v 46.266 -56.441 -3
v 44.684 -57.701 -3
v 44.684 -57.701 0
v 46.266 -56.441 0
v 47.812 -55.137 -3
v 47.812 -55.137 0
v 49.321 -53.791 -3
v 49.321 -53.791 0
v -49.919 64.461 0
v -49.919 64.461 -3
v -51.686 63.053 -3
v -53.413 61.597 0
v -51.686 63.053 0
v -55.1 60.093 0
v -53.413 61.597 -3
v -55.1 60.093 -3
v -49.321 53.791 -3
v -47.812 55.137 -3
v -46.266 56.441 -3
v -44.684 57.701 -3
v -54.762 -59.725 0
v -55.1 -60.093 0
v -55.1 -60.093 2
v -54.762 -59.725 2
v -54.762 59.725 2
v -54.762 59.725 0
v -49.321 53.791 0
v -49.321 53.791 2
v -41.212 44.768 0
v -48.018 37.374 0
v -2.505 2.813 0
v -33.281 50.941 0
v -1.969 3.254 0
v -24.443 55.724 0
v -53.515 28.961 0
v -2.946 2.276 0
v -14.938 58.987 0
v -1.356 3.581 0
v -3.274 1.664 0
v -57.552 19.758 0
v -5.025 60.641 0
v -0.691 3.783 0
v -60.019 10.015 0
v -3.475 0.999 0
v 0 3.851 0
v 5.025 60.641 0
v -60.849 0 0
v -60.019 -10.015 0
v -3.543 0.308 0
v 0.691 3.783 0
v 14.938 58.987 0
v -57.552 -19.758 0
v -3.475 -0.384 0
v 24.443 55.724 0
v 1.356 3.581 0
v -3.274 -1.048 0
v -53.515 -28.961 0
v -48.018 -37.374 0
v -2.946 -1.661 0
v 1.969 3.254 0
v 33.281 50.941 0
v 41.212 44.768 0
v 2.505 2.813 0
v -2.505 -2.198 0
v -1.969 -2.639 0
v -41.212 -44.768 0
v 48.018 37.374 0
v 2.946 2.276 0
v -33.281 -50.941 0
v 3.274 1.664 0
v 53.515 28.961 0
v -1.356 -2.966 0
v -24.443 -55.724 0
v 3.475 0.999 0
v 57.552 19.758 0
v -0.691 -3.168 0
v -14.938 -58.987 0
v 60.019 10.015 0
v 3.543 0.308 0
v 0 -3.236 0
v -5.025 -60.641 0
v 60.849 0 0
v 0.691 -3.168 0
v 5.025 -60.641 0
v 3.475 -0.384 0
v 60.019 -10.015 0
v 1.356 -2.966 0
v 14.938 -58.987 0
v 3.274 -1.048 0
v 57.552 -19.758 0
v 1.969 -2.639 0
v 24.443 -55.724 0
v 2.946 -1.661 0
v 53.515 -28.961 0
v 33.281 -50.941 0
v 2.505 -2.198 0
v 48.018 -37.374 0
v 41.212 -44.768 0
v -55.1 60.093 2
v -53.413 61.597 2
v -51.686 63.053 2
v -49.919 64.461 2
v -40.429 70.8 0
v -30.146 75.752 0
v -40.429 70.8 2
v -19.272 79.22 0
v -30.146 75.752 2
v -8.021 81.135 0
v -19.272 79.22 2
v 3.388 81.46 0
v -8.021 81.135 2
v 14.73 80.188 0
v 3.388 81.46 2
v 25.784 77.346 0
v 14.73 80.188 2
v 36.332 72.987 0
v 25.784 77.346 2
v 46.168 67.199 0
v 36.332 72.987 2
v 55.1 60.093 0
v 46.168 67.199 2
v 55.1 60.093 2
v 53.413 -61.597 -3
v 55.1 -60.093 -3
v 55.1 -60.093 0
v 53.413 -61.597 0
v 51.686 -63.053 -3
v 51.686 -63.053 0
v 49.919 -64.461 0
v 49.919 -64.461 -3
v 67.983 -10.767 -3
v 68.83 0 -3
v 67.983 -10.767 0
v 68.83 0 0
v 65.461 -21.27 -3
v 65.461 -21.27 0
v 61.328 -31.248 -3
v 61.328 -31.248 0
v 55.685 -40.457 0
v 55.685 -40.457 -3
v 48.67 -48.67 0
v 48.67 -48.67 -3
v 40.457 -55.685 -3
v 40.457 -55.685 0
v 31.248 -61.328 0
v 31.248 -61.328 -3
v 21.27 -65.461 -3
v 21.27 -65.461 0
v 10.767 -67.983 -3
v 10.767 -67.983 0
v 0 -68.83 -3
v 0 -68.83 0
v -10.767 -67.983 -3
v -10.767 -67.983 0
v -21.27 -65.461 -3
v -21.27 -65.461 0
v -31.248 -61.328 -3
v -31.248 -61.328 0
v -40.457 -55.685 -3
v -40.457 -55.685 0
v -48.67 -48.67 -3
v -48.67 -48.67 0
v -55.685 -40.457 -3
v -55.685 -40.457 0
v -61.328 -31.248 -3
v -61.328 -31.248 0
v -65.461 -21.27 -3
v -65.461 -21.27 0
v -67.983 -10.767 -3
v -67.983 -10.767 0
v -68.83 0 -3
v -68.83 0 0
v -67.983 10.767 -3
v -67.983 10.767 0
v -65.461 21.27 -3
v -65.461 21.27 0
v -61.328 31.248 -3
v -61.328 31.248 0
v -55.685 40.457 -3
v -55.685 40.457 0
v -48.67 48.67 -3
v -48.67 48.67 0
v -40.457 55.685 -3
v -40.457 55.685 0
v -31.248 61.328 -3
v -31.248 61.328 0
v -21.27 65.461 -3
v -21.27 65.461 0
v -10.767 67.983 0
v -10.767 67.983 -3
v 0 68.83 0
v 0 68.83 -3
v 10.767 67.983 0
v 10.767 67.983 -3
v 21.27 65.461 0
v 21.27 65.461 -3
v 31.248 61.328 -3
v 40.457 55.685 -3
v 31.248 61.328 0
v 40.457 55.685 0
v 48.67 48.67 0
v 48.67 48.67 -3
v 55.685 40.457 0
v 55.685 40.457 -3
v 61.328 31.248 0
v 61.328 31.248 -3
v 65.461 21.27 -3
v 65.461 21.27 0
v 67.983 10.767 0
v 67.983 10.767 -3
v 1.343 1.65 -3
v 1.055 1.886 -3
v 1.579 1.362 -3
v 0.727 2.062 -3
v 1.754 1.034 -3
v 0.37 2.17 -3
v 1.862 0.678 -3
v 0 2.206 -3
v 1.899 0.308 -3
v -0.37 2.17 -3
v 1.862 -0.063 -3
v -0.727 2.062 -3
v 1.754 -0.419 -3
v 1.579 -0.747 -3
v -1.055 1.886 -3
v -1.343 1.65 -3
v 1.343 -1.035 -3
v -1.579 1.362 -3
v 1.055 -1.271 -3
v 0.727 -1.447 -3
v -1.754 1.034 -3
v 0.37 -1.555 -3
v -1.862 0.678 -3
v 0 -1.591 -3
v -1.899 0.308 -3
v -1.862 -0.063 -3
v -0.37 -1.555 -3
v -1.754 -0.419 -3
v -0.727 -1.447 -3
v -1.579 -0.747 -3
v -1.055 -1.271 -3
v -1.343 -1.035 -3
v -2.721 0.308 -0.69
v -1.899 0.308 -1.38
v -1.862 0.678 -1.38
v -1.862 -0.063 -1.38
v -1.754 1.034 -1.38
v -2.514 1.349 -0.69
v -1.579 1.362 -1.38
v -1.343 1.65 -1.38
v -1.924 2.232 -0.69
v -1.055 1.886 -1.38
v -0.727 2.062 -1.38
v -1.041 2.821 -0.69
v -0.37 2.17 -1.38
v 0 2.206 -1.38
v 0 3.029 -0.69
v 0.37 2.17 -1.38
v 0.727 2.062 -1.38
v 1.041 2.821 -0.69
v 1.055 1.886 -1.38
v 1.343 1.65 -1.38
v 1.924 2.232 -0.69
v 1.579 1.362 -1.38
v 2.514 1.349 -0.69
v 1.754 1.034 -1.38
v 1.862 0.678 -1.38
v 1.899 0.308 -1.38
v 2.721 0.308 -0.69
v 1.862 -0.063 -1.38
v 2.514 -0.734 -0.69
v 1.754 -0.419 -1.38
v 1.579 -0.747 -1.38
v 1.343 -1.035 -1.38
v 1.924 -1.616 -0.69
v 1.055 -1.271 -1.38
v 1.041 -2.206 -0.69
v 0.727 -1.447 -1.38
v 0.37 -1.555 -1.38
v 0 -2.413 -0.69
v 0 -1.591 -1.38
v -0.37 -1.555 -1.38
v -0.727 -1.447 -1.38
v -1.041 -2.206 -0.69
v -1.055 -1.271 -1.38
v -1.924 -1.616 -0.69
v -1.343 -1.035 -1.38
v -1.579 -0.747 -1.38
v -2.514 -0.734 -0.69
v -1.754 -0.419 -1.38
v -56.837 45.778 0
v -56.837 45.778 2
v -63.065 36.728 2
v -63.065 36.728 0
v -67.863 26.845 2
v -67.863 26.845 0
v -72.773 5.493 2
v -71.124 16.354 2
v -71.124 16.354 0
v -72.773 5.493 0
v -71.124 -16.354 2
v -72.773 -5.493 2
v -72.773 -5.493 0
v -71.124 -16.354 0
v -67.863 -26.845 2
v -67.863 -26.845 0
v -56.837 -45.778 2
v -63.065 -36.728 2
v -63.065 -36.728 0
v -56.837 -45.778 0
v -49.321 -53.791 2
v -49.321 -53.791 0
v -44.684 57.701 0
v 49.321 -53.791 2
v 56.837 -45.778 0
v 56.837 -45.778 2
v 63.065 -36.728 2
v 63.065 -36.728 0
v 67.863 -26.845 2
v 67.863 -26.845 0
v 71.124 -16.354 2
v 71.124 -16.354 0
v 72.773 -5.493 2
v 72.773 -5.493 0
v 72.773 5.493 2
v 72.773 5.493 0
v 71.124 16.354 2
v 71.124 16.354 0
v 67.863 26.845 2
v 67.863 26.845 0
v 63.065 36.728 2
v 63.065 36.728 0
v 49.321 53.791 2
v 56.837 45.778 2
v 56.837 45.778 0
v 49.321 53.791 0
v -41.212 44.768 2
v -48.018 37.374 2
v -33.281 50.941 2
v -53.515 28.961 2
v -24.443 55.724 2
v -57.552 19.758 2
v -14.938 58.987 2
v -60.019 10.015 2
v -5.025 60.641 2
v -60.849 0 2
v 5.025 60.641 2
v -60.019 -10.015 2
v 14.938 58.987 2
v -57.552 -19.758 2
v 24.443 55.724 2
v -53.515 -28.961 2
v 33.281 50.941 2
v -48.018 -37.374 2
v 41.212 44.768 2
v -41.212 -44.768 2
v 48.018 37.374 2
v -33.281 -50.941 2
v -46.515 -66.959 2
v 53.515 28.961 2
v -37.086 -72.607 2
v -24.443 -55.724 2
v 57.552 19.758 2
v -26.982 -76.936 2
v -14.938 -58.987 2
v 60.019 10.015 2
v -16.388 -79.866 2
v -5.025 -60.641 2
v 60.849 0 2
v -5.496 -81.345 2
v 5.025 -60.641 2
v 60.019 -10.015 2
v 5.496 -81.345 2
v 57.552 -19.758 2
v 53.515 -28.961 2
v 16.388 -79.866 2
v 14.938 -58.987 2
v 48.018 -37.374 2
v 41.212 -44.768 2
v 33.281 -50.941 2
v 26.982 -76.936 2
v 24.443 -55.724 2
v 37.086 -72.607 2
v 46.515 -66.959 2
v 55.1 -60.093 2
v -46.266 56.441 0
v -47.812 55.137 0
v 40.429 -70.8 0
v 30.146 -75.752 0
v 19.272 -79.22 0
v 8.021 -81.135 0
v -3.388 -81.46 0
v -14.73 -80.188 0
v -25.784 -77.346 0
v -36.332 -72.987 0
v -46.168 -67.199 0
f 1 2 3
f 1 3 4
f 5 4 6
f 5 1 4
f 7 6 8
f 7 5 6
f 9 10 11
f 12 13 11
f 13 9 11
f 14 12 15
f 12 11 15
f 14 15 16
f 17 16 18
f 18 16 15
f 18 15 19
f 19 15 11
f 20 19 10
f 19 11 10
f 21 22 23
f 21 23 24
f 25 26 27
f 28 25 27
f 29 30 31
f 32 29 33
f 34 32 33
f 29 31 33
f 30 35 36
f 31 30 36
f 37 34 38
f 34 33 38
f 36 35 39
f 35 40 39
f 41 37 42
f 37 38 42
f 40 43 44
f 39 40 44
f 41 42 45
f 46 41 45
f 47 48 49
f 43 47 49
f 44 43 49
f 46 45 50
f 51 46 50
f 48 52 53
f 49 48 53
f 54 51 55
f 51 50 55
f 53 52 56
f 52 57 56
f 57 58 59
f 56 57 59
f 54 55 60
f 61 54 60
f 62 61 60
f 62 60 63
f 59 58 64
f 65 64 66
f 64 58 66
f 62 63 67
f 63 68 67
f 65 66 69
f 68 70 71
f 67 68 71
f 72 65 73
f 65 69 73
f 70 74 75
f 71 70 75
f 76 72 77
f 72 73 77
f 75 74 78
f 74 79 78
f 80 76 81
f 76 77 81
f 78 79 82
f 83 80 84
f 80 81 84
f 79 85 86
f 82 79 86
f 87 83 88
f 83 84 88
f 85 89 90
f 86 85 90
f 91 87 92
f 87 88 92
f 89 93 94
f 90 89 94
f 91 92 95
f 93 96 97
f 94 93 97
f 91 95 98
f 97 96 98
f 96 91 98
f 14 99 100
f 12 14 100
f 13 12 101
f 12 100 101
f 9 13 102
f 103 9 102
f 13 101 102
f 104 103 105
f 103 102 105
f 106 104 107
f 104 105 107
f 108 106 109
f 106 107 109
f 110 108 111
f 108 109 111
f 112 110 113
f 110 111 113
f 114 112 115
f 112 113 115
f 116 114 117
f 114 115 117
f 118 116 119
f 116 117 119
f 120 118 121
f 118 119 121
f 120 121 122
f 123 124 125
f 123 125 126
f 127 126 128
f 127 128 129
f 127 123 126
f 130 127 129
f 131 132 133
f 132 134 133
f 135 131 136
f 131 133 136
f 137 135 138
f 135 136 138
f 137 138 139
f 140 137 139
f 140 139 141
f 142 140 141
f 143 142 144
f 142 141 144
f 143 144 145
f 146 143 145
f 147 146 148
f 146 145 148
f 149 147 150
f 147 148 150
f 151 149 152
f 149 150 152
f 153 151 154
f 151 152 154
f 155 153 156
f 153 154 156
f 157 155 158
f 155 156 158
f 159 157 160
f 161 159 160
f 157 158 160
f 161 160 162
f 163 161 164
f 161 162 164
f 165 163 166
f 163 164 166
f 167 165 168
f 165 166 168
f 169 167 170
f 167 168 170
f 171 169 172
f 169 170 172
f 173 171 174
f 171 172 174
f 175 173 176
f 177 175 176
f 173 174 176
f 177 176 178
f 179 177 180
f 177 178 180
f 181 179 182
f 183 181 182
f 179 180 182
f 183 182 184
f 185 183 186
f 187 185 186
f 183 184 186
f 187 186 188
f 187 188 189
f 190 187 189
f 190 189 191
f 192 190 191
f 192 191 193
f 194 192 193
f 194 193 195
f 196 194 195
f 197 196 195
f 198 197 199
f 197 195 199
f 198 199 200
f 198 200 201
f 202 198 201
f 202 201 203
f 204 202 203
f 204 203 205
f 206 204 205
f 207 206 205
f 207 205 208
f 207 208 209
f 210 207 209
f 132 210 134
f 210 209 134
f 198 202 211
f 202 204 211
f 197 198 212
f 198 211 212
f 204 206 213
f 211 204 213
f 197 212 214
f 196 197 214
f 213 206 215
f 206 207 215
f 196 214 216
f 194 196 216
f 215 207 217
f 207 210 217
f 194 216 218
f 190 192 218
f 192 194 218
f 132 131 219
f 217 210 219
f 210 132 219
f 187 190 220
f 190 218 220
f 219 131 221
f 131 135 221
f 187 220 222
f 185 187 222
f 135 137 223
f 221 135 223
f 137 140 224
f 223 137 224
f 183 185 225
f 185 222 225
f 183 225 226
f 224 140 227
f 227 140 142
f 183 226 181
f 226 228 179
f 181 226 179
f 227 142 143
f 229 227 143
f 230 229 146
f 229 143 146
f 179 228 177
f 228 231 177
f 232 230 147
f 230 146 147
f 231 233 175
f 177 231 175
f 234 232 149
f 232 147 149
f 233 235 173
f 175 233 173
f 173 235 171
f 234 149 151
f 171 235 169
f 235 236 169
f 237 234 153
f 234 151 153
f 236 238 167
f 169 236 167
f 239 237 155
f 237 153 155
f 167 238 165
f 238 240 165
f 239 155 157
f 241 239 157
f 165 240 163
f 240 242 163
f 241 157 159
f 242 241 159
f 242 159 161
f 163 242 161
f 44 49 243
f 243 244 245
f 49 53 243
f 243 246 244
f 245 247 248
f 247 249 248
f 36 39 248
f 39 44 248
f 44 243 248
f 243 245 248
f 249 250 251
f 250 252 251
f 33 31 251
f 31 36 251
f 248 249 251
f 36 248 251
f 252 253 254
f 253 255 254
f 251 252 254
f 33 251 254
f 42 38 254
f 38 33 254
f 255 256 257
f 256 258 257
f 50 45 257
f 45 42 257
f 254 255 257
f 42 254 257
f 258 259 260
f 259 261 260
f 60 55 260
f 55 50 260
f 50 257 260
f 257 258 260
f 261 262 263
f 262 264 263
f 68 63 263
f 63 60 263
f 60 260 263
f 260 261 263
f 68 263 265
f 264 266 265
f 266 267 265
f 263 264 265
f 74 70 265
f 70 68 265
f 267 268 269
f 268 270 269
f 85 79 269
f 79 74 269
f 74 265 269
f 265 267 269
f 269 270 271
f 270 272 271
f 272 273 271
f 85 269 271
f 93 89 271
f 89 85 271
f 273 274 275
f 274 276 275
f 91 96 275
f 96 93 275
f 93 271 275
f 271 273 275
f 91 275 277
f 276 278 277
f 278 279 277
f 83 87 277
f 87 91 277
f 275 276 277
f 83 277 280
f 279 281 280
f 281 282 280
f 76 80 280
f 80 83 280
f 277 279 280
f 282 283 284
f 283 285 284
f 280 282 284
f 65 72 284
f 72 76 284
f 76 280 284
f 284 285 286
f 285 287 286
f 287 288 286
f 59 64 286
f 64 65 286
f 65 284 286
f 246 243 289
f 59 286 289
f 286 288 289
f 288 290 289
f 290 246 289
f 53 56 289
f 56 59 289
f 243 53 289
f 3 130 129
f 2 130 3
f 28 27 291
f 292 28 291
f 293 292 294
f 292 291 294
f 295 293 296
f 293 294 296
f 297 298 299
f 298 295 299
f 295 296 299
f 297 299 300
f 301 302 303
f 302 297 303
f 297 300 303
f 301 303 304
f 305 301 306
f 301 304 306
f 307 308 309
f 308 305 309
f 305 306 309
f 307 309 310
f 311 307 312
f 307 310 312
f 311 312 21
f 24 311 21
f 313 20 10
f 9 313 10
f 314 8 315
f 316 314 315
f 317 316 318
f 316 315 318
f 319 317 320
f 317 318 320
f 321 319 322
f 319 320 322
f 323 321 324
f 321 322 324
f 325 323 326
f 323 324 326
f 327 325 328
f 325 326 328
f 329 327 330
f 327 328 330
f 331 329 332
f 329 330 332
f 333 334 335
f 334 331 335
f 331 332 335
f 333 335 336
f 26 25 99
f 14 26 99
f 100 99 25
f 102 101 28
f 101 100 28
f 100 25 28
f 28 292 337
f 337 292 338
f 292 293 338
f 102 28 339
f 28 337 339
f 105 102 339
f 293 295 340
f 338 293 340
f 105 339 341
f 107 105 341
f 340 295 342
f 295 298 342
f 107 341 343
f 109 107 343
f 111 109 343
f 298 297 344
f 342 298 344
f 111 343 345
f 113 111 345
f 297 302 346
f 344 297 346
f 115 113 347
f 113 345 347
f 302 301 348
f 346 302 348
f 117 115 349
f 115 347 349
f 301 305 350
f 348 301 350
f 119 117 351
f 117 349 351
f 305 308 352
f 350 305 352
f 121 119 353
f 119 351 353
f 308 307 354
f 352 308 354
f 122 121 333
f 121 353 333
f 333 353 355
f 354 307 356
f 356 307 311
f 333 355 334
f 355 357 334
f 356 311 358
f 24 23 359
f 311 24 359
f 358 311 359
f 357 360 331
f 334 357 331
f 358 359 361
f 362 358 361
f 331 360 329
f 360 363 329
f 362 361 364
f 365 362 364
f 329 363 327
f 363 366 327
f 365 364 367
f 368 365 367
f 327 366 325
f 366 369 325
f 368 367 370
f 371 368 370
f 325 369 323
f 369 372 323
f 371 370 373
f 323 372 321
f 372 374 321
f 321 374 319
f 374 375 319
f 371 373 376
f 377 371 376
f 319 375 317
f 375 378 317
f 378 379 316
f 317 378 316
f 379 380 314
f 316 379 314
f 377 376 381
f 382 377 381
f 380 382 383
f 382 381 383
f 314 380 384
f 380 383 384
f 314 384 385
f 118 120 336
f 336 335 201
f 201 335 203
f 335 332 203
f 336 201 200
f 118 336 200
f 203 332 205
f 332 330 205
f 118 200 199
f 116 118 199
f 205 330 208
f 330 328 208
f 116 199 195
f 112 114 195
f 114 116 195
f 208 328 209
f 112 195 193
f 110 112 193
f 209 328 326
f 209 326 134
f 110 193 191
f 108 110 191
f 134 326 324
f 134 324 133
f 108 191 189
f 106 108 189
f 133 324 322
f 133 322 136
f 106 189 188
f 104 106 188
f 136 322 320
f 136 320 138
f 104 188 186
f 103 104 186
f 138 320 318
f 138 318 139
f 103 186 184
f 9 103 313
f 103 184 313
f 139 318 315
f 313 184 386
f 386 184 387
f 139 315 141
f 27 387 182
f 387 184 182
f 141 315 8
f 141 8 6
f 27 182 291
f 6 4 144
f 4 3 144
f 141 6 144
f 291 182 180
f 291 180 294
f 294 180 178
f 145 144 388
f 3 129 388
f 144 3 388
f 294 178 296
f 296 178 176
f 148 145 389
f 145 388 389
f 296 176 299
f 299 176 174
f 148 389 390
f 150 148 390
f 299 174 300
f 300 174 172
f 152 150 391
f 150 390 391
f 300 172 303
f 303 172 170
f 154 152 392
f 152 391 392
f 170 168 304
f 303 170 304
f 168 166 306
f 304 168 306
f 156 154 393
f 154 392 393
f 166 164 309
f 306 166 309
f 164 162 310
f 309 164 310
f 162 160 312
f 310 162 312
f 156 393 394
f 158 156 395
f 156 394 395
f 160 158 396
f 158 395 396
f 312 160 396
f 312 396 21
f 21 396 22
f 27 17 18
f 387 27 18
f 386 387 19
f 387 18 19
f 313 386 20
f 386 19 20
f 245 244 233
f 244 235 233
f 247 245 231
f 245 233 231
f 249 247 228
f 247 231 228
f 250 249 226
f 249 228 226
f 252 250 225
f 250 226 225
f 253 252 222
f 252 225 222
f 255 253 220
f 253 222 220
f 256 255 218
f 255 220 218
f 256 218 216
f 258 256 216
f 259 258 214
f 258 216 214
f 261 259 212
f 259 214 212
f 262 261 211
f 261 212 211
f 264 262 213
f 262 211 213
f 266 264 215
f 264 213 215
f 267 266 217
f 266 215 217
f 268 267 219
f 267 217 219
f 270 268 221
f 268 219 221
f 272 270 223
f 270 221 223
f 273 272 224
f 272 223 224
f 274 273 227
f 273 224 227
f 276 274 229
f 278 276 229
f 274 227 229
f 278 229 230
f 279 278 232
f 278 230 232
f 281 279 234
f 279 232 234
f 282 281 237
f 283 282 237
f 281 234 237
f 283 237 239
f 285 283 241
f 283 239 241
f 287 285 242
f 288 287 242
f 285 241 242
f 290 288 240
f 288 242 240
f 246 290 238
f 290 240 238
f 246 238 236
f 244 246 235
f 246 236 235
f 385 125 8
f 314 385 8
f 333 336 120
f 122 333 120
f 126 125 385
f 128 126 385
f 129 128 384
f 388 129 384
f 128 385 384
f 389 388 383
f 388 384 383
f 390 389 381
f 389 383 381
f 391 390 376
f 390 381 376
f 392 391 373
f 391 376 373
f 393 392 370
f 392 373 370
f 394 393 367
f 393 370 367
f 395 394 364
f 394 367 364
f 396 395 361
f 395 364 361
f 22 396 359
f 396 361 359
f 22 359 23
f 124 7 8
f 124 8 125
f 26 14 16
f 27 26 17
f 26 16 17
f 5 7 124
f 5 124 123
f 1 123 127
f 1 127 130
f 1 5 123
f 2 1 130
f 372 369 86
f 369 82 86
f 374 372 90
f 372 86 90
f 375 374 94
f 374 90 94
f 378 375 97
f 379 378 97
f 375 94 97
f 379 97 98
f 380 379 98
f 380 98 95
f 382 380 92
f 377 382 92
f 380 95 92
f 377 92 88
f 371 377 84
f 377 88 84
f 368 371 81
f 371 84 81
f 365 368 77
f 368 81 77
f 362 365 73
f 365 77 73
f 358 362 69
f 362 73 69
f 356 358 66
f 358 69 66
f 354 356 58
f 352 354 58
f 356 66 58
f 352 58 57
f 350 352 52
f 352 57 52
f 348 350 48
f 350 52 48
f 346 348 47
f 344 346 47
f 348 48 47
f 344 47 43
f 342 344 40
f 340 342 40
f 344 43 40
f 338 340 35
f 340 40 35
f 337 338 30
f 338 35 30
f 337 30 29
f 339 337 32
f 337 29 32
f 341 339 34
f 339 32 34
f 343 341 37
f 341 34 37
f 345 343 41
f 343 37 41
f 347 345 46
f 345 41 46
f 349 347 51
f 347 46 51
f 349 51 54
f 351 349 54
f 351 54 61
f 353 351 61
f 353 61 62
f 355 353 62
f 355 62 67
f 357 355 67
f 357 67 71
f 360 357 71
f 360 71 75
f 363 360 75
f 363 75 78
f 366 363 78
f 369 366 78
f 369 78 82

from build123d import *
from build123d.topology import SkipClean

# Parameters (mm, degrees)
CSK_FOR_6_FLAT_HEAD_MACHINE_SCREW_100_D           = 3.7973
CSK_FOR_6_FLAT_HEAD_MACHINE_SCREW_100_CSINK_D     = 7.0866
CSK_FOR_6_FLAT_HEAD_MACHINE_SCREW_100_CSINK_ANGLE = 100
CUT_EXTRUDE1_DEPTH                                = 10
CUT_EXTRUDE2_DEPTH                                = 116.409192875
CUT_EXTRUDE2_DEPTH_BACK                           = 116.409192875
BOSS_EXTRUDE1_START                               = -5
BOSS_EXTRUDE1_DEPTH                               = 5
CUT_EXTRUDE3_DEPTH                                = 10


with BuildPart() as part:
    # Sketch1 → Revolve1 (revolve)
    with BuildSketch(Plane(origin=(0, 0, 0), x_dir=(1, 0, 0), z_dir=(0, 1, 0)), mode=Mode.PRIVATE) as revolve1_sk:
        Polygon((-68.83, 3), (-68.83, 0), (-81.53, 0), (-81.53, -2), (-68.83, -2), (-60.848940548, -2), (-60.848940548, 0), (0, 0), (0, 3), align=None)
    revolve(revolve1_sk.sketch.rotate(Axis((0, 0, 0), (0, 0, -1)), 180), axis=Axis((0, 0, 0), (0, 0, -1)))

    # CSK for #6 Flat Head Machine Screw (100)1 (through all)
    with Locations(Plane(origin=(0, 0.307599269, 0), x_dir=(1, 0, 0), z_dir=(0, 0, 1))):
        with Locations((0, 0)):
            CounterSinkHole(CSK_FOR_6_FLAT_HEAD_MACHINE_SCREW_100_D / 2, CSK_FOR_6_FLAT_HEAD_MACHINE_SCREW_100_CSINK_D / 2, counter_sink_angle=CSK_FOR_6_FLAT_HEAD_MACHINE_SCREW_100_CSINK_ANGLE)

    # Sketch5 → Cut-Extrude1 (cut)
    with BuildSketch(Plane(origin=(0, 0, 0), x_dir=(-1, 0, 0), z_dir=(0, 0, -1))):
        with BuildLine():
            Line((-49.321326643, 53.791143678), (-57.904237692, 63.151893537))
            ThreePointArc((-57.904237692, 63.151893537), (-85.68, 0), (-57.904237692, -63.151893537))
            Line((-57.904237692, -63.151893537), (-49.321326643, -53.791143678))
            ThreePointArc((-49.321326643, -53.791143678), (-72.98, 0), (-49.321326643, 53.791143678))
        make_face()
    extrude(amount=-CUT_EXTRUDE1_DEPTH, mode=Mode.SUBTRACT)

    # Sketch6 → Cut-Extrude2 (cut, two sides: drawn at the far end of the back side and taken through both)
    with BuildSketch(Plane.XY.offset(2).offset(-CUT_EXTRUDE2_DEPTH_BACK)):
        with BuildLine():
            Line((-54.761675773, 59.724532368), (-49.321326643, 53.791143678))
            ThreePointArc((-49.321326643, 53.791143678), (-72.98, 0), (-49.321326643, -53.791143678))
            Line((-49.321326643, -53.791143678), (-54.761675773, -59.724532368))
            ThreePointArc((-54.761675773, -59.724532368), (-81.03, 0), (-54.761675773, 59.724532368))
        make_face()
    extrude(amount=CUT_EXTRUDE2_DEPTH + CUT_EXTRUDE2_DEPTH_BACK, mode=Mode.SUBTRACT)

    # Sketch7 → Boss-Extrude1 (add)
    with SkipClean():  # the faces are left unmerged after this step: merging them gives an invalid solid
        with BuildSketch(Plane.XY.offset(2).offset(BOSS_EXTRUDE1_START)):
            with BuildLine():
                Line((49.321326643, -53.791143678), (55.099585656, -60.093065827))
                ThreePointArc((55.099585656, -60.093065827), (52.554806839, -62.330836495), (49.919235, -64.460925195))
                Line((49.919235, -64.460925195), (44.684236113, -57.700948372))
                ThreePointArc((44.684236113, -57.700948372), (47.043417185, -55.794240738), (49.321326643, -53.791143678))
            make_face()
            with BuildLine():
                Line((-44.684236113, 57.700948372), (-49.919235, 64.460925195))
                ThreePointArc((-49.919235, 64.460925195), (-52.554806839, 62.330836495), (-55.099585656, 60.093065827))
                Line((-55.099585656, 60.093065827), (-49.321326643, 53.791143678))
                ThreePointArc((-49.321326643, 53.791143678), (-47.043417185, 55.794240738), (-44.684236113, 57.700948372))
            make_face()
        extrude(amount=BOSS_EXTRUDE1_DEPTH)

    # Sketch9 → Cut-Extrude3 (cut)
    with BuildSketch(Plane.XY.offset(2)):
        with BuildLine():
            Line((-54.761675773, 59.724532368), (-55.099585656, 60.093065827))
            ThreePointArc((-55.099585656, 60.093065827), (-81.53, 0), (-55.099585656, -60.093065827))
            Line((-55.099585656, -60.093065827), (-54.761675773, -59.724532368))
            ThreePointArc((-54.761675773, -59.724532368), (-81.03, 0), (-54.761675773, 59.724532368))
        make_face()
    extrude(amount=-CUT_EXTRUDE3_DEPTH, mode=Mode.SUBTRACT)


solid = part.part
